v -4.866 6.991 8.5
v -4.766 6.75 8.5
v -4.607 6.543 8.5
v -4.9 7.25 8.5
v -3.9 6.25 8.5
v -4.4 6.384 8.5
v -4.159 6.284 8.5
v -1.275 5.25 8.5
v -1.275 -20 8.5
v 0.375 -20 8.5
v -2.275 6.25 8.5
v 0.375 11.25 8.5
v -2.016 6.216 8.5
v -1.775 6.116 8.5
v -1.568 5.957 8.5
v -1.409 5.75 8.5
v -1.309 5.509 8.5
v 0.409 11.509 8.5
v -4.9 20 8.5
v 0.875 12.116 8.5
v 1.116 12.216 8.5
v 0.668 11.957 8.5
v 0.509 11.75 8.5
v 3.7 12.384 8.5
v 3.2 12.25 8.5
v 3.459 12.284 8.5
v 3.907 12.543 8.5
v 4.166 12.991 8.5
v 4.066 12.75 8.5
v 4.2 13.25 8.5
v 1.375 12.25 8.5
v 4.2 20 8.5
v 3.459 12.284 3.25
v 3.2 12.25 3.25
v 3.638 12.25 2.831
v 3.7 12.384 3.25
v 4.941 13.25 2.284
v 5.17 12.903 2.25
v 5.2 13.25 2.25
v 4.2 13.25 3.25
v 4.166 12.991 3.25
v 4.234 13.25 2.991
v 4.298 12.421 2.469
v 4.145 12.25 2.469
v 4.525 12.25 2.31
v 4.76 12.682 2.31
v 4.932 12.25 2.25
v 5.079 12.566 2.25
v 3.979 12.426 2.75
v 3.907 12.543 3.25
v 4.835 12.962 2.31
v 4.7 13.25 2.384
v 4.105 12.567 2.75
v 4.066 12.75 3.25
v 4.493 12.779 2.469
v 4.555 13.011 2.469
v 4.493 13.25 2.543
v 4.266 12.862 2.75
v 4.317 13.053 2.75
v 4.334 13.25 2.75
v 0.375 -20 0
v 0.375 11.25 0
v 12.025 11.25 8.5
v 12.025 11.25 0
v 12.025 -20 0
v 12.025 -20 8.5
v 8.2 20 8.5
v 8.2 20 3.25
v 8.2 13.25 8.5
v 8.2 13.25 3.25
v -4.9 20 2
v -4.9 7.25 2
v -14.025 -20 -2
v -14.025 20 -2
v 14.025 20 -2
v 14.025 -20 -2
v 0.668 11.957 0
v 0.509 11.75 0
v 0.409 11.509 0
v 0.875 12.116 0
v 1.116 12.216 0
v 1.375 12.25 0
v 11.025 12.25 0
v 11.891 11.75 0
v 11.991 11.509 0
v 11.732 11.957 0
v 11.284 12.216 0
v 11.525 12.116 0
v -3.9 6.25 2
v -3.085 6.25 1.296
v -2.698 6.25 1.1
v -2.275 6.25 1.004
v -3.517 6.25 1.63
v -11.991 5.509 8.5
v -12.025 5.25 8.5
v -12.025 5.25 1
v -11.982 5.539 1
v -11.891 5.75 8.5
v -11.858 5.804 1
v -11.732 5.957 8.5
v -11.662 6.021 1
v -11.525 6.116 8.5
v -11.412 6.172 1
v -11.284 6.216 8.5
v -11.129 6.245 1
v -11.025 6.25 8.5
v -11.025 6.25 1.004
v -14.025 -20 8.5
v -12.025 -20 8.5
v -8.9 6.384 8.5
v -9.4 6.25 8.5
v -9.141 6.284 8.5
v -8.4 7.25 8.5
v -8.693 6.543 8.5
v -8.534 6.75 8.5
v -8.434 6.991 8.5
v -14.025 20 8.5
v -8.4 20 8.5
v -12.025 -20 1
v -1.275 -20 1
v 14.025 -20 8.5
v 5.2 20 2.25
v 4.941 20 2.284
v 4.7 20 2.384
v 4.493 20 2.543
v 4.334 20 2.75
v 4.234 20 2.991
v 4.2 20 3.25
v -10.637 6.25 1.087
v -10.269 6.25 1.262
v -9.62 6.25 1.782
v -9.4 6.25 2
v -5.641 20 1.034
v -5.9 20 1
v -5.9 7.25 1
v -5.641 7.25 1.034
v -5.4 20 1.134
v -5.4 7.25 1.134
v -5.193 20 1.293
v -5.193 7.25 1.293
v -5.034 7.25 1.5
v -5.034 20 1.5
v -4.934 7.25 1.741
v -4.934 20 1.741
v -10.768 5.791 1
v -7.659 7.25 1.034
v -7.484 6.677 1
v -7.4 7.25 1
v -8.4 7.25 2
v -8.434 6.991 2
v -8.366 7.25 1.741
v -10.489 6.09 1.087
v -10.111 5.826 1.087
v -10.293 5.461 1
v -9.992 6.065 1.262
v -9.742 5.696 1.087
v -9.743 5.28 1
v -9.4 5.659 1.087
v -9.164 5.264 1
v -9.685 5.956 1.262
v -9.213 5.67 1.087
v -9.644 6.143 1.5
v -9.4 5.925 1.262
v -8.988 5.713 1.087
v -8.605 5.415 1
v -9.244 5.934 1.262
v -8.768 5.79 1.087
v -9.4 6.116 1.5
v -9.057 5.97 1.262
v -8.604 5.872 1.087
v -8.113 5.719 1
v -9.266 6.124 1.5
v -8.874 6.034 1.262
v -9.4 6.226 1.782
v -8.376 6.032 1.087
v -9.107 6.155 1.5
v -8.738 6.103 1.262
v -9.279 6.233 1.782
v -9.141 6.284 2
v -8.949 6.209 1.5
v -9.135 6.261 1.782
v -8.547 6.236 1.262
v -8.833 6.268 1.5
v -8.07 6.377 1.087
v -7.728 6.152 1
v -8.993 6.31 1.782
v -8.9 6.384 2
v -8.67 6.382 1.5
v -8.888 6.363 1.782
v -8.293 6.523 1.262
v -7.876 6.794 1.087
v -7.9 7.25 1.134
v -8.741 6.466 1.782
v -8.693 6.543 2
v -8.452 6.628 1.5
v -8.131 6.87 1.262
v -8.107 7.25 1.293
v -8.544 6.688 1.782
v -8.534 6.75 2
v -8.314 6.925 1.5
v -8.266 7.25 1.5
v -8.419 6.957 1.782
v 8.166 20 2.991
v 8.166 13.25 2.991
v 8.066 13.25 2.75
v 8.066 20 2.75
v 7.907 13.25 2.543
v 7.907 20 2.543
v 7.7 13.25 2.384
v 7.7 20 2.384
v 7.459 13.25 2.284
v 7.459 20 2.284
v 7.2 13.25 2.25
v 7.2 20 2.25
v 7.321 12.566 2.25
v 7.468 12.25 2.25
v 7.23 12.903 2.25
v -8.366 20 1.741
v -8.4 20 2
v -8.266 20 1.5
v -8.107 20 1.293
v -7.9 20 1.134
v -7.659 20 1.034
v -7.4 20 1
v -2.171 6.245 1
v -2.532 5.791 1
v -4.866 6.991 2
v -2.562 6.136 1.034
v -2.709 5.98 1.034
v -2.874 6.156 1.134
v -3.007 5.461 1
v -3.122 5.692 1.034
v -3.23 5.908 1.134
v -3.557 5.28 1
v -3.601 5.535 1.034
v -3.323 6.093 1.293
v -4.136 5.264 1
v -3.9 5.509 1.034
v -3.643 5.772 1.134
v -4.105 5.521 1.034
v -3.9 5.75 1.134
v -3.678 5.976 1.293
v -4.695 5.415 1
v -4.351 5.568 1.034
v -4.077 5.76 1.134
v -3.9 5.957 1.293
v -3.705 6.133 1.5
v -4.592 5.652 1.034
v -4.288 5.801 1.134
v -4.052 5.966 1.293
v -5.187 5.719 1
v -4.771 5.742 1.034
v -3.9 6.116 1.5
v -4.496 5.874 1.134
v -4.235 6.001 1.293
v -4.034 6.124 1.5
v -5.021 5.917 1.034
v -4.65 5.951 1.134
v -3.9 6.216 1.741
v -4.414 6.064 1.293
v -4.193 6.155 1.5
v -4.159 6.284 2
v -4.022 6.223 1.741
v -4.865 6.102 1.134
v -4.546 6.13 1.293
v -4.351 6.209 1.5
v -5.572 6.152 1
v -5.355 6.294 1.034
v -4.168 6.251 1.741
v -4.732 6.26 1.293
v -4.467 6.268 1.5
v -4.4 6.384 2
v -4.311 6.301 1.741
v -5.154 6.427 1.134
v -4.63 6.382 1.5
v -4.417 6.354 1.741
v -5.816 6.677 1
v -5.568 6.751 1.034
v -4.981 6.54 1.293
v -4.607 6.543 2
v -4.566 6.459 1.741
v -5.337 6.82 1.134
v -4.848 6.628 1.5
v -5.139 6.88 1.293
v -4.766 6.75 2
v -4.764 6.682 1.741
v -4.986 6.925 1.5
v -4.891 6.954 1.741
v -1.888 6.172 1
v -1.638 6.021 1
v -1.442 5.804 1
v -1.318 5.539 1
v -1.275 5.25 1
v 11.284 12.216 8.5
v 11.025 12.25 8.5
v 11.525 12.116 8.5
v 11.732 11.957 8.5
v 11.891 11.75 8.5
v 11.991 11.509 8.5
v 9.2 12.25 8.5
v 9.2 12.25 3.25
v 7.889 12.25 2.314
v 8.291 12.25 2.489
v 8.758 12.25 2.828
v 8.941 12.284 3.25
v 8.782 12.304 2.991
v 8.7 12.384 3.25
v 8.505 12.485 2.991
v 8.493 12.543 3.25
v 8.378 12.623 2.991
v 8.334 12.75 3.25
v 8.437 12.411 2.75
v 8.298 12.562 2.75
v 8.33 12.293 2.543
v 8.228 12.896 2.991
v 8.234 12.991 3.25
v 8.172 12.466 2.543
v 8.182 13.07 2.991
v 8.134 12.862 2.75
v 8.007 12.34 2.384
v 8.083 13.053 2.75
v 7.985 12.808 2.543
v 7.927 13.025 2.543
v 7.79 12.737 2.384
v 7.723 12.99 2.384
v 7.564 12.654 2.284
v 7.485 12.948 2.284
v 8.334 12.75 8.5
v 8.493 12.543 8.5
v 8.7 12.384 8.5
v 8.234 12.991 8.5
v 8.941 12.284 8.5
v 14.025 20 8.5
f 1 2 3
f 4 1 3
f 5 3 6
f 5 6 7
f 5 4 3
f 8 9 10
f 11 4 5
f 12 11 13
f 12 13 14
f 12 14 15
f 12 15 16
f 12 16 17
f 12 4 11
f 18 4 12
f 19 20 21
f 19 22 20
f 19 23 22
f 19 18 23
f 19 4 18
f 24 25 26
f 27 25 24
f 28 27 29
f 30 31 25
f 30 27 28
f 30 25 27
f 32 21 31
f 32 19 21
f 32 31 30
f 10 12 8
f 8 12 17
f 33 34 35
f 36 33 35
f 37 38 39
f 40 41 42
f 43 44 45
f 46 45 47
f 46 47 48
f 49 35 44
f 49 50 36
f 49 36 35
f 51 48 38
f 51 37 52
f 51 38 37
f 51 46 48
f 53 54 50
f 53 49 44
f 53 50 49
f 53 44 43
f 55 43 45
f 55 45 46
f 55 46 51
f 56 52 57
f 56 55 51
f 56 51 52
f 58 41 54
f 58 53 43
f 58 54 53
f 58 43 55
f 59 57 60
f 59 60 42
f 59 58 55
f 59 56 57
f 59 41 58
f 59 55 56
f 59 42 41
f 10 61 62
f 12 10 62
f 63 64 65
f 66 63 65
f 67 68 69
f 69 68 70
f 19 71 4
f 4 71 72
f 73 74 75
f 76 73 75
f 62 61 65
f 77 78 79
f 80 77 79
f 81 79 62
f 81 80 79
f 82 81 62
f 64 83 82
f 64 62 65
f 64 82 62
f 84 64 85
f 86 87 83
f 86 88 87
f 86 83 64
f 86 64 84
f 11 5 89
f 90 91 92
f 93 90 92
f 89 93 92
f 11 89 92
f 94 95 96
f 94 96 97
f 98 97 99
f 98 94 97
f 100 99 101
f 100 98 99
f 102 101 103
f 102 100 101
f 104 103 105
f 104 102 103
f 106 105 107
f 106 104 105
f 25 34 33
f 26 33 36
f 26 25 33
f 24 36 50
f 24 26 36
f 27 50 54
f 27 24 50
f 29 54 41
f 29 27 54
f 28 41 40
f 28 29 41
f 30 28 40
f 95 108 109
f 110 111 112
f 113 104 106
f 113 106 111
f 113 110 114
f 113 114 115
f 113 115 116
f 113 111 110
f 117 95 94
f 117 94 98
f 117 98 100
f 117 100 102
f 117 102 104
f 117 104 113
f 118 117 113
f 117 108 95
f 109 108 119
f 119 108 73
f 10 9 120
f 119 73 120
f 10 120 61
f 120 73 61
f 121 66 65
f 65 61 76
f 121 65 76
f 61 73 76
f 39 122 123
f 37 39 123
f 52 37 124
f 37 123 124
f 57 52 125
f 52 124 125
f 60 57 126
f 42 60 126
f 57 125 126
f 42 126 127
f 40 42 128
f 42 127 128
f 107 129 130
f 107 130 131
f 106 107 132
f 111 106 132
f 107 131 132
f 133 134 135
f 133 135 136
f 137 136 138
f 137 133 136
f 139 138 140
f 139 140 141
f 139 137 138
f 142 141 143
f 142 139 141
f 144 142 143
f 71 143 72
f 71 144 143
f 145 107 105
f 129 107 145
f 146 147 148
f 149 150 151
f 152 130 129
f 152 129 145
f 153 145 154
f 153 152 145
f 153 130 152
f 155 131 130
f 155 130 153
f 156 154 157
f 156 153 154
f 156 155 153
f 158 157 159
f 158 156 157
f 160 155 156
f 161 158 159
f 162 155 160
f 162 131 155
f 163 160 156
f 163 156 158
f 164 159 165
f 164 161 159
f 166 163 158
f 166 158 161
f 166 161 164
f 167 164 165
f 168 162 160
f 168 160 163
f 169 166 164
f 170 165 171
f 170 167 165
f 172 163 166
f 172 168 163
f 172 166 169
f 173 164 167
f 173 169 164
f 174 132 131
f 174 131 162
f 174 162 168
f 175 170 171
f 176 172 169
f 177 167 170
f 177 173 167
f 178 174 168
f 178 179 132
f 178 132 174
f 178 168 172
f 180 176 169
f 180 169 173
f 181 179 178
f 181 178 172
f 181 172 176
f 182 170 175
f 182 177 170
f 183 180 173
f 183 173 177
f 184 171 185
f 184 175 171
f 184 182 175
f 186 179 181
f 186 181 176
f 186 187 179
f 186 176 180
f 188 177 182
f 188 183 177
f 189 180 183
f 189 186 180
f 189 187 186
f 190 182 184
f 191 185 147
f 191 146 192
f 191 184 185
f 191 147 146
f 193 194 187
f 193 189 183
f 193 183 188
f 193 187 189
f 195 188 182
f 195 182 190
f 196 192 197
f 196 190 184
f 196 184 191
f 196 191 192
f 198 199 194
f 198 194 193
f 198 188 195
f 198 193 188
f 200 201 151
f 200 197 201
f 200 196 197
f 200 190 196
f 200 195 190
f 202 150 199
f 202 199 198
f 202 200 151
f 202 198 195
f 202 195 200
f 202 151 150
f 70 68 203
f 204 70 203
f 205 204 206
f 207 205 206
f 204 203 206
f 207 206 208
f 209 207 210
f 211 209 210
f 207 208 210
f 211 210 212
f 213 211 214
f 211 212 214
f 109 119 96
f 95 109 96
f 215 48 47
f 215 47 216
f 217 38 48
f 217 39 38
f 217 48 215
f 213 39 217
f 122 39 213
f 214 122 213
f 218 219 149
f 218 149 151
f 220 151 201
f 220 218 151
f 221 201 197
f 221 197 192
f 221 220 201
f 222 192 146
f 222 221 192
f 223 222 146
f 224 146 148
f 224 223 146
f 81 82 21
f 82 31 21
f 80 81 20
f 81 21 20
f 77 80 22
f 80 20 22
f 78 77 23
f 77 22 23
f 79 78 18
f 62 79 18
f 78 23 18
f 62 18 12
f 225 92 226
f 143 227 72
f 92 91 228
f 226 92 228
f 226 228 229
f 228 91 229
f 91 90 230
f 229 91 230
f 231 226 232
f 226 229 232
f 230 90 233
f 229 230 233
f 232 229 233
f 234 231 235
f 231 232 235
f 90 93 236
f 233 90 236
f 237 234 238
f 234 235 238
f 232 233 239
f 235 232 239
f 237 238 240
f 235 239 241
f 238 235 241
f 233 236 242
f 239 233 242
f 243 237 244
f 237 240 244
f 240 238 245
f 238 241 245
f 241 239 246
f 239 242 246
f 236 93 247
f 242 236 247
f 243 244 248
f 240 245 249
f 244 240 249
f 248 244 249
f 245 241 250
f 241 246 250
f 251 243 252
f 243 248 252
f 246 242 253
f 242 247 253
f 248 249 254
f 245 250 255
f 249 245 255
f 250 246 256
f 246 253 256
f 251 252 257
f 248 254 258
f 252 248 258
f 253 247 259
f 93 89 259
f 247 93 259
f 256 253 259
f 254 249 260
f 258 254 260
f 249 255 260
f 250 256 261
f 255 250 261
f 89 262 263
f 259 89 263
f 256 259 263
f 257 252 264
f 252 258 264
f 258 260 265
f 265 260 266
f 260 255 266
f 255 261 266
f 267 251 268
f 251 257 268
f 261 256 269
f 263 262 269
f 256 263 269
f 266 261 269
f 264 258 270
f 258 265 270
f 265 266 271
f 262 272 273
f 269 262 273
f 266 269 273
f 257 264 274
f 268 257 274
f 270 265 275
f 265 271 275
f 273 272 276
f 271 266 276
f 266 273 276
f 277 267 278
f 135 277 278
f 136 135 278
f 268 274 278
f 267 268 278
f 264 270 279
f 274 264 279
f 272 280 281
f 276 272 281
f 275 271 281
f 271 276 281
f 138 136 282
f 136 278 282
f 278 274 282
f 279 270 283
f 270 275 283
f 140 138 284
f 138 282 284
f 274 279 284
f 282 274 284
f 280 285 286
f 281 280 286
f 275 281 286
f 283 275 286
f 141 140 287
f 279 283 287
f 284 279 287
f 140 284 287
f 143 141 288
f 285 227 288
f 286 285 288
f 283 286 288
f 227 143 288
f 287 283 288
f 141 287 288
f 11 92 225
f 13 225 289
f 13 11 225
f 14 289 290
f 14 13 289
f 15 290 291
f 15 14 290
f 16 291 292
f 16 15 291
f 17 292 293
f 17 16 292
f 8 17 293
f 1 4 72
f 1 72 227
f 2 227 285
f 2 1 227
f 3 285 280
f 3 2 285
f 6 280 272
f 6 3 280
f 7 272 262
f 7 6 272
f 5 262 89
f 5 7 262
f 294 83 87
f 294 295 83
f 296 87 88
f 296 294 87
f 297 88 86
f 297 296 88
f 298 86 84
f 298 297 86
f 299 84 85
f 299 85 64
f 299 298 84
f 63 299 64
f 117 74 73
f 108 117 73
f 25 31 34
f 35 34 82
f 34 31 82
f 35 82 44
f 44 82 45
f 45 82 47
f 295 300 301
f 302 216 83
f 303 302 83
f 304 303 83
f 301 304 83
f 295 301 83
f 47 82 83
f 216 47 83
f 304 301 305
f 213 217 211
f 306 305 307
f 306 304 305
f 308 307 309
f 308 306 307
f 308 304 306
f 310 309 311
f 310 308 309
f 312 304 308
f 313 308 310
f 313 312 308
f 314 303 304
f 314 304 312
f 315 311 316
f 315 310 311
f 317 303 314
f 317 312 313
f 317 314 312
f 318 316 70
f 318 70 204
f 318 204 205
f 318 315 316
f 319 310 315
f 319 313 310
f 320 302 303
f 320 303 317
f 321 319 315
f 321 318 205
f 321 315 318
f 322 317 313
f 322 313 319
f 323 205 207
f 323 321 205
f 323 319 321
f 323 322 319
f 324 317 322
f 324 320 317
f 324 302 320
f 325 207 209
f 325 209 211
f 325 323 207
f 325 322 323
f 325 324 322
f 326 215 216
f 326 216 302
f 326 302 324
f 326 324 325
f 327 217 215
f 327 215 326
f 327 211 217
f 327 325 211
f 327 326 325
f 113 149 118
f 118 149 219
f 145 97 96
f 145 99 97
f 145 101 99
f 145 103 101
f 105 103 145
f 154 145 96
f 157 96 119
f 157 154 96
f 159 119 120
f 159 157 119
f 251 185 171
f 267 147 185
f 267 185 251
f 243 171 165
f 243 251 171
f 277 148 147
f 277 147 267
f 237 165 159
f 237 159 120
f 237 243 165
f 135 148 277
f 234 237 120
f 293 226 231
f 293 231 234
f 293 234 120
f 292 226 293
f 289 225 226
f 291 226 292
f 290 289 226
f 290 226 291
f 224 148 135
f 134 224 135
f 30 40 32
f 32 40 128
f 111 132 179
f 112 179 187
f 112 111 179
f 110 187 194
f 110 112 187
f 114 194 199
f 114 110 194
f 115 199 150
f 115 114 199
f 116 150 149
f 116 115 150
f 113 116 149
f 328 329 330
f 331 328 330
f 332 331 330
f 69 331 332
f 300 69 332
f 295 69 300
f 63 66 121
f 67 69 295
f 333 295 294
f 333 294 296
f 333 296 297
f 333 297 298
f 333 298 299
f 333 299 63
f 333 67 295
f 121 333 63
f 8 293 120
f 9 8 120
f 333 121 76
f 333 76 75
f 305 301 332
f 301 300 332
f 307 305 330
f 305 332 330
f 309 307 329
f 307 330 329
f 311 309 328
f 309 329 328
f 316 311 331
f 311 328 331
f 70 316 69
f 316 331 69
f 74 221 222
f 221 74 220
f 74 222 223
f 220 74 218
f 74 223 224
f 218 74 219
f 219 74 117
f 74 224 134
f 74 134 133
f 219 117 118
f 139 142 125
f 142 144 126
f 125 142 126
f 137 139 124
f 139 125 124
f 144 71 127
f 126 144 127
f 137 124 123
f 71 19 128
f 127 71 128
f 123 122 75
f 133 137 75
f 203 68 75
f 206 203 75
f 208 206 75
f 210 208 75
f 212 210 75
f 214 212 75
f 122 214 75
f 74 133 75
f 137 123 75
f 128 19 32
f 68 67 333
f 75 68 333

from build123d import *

# Parameters (mm, degrees)
F0_W         = 3.5
F0_H         = 13.75
F0_W_2       = 4
F0_H_2       = 7.75
F1_DEPTH     = 2
F2_DEPTH     = 8.5
F3_DEPTH     = 1
F4_DEPTH     = 2.25
F5_R         = 1
F6_T1_DEPTH  = 12.75
F6_T3_DEPTH  = 6.75
F6_T6_ANGLE  = 233.2969892374
F6_T8_ANGLE  = 233.2969892374
F6_T12_ANGLE = 233.2969892374
F6_T17_ANGLE = 233.2969892374


# Not quite as in the source:
# - a fillet or chamfer that OpenCascade refuses, or shapes differently, is made with other operations: its cross-section is extruded or revolved along the edge and cut away or added


with BuildPart() as f1:
    # F0 (on Top) → F1 (new body)
    with BuildSketch(Plane.XY):
        Polygon((-12.025, -20), (-1.275, -20), (-1.275, 6.25), (-4.9, 6.25), (-8.4, 6.25), (-12.025, 6.25), align=None)
        Polygon((-14.025, -20), (-12.025, -20), (-12.025, 6.25), (-8.4, 6.25), (-8.4, 20), (-14.025, 20), align=None)
        Polygon((-1.275, -20), (0.375, -20), (0.375, 12.25), (4.2, 12.25), (4.2, 20), (-4.9, 20), (-4.9, 6.25), (-1.275, 6.25), align=None)
        with Locations((-6.65, 13.125)):
            Rectangle(F0_W, F0_H)
        with Locations((6.2, 16.125)):
            Rectangle(F0_W_2, F0_H_2)
        Polygon((0.375, -20), (12.025, -20), (12.025, 12.25), (8.2, 12.25), (4.2, 12.25), (0.375, 12.25), align=None)
        Polygon((12.025, -20), (14.025, -20), (14.025, 20), (8.2, 20), (8.2, 12.25), (12.025, 12.25), align=None)
    extrude(amount=-F1_DEPTH)

    # F0 (on Top) → F2 (join)
    with BuildSketch(Plane.XY):
        Polygon((-14.025, -20), (-12.025, -20), (-12.025, 6.25), (-8.4, 6.25), (-8.4, 20), (-14.025, 20), align=None)
        Polygon((-1.275, -20), (0.375, -20), (0.375, 12.25), (4.2, 12.25), (4.2, 20), (-4.9, 20), (-4.9, 6.25), (-1.275, 6.25), align=None)
        Polygon((12.025, -20), (14.025, -20), (14.025, 20), (8.2, 20), (8.2, 12.25), (12.025, 12.25), align=None)
    extrude(amount=F2_DEPTH)

    # F0 (on Top) → F3 (join)
    with BuildSketch(Plane.XY):
        Polygon((-12.025, -20), (-1.275, -20), (-1.275, 6.25), (-4.9, 6.25), (-8.4, 6.25), (-12.025, 6.25), align=None)
        with Locations((-6.65, 13.125)):
            Rectangle(F0_W, F0_H)
    extrude(amount=F3_DEPTH)

    # F0 (on Top) → F4 (join)
    with BuildSketch(Plane.XY):
        with Locations((6.2, 16.125)):
            Rectangle(F0_W_2, F0_H_2)
    extrude(amount=F4_DEPTH)

    # F5
    f5_edges = [f1.edges().sort_by_distance(p)[0] for p in [
        (-12.025, 6.25, 4.75),
        (-8.4, 6.25, 4.75),
        (-4.9, 6.25, 4.75),
        (-1.275, 6.25, 4.75),
        (4.2, 12.25, 5.375),
        (8.2, 12.25, 5.375),
        (0.375, 12.25, 4.25),
        (12.025, 12.25, 4.25),
    ]]
    fillet(f5_edges, radius=F5_R)

    # F6: fillet of radius 1 on 8 edges, made by hand

    # F6_s2 → F6_t1 (join)
    with BuildSketch(Plane.XZ.offset(-20)):
        with BuildLine():
            ThreePointArc((-8.4, 2), (-8.1071067812, 1.2928932188), (-7.4, 1))
            Line((-7.4, 1), (-8.4, 1))
            Line((-8.4, 1), (-8.4, 2))
        make_face()
        with BuildLine():
            ThreePointArc((-5.9, 1), (-5.1928932188, 1.2928932188), (-4.9, 2))
            Line((-4.9, 2), (-4.9, 1))
            Line((-4.9, 1), (-5.9, 1))
        make_face()
    extrude(amount=F6_T1_DEPTH)

    # F6_s4 → F6_t3 (join)
    with BuildSketch(Plane.XZ.offset(-20)):
        with BuildLine():
            ThreePointArc((5.2, 2.25), (4.4928932188, 2.5428932188), (4.2, 3.25))
            Line((4.2, 3.25), (4.2, 2.25))
            Line((4.2, 2.25), (5.2, 2.25))
        make_face()
        with BuildLine():
            ThreePointArc((8.2, 3.25), (7.9071067812, 2.5428932188), (7.2, 2.25))
            Line((7.2, 2.25), (8.2, 2.25))
            Line((8.2, 2.25), (8.2, 3.25))
        make_face()
    extrude(amount=F6_T3_DEPTH)

    # F6_s5 → F6_t6 (revolve)
    with BuildSketch(Plane(origin=(-2.5682338051, -1.9145124235, 0), x_dir=(0, 0, 1), z_dir=(0.8017442393, 0.5976672776, 0))):
        with BuildLine():
            ThreePointArc((1, -13.4307181447), (1.2928932188, -12.7236113635), (2, -12.4307181447))
            Line((2, -12.4307181447), (1, -12.4307181447))
            Line((1, -12.4307181447), (1, -13.4307181447))
        make_face()
    revolve(axis=Axis((-9.4, 7.25, 1), (0, 0, 1)), revolution_arc=F6_T6_ANGLE)

    # F6_s7 → F6_t8 (revolve)
    with BuildSketch(Plane(origin=(-5.9809240707, 4.4585323247, 0), x_dir=(0, 0, 1), z_dir=(-0.8017442393, 0.5976672776, 0))):
        with BuildLine():
            ThreePointArc((1, 5.4817433521), (1.2928932188, 4.774636571), (2, 4.4817433521))
            Line((2, 4.4817433521), (1, 4.4817433521))
            Line((1, 4.4817433521), (1, 5.4817433521))
        make_face()
    revolve(axis=Axis((-3.9, 7.25, 1), (0, 0, -1)), revolution_arc=F6_T8_ANGLE)


with BuildPart() as f6_tool10:
    # F6_s11 → F6_t12 (revolve)
    with BuildSketch(Plane(origin=(8.4060261742, 6.2663459654, 0), x_dir=(0, 0, 1), z_dir=(0.8017442393, 0.5976672776, 0))):
        with BuildLine():
            ThreePointArc((2.25, -10.7105758823), (2.5428932188, -10.0034691011), (3.25, -9.7105758823))
            Line((3.25, -9.7105758823), (2.25, -9.7105758823))
            Line((2.25, -9.7105758823), (2.25, -10.7105758823))
        make_face()
    revolve(axis=Axis((3.2, 13.25, 2.25), (0, 0, 1)), revolution_arc=F6_T12_ANGLE)

    split(bisect_by=Plane.XZ.offset(-12.25), keep=Keep.BOTTOM)


with BuildPart() as f1_1:
    add(f1.part)

    # F6_t9: union F6_tool10
    add(f6_tool10.part)


with BuildPart() as f6_tool15:
    # F6_s16 → F6_t17 (revolve)
    with BuildSketch(Plane(origin=(-0.4353827411, 0.3245598844, 0), x_dir=(0, 0, 1), z_dir=(-0.8017442393, 0.5976672776, 0))):
        with BuildLine():
            ThreePointArc((3.25, 17.1216501249), (2.5428932188, 17.4145433437), (2.25, 18.1216501249))
            Line((2.25, 18.1216501249), (2.25, 17.1216501249))
            Line((2.25, 17.1216501249), (3.25, 17.1216501249))
        make_face()
    revolve(axis=Axis((9.2, 13.25, 2.25), (0, 0, -1)), revolution_arc=F6_T17_ANGLE)

    split(bisect_by=Plane.XZ.offset(-12.25), keep=Keep.BOTTOM)


with BuildPart() as f1_2:
    add(f1_1.part)

    # F6_t14: union F6_tool15
    add(f6_tool15.part)


solid = f1_2.part
